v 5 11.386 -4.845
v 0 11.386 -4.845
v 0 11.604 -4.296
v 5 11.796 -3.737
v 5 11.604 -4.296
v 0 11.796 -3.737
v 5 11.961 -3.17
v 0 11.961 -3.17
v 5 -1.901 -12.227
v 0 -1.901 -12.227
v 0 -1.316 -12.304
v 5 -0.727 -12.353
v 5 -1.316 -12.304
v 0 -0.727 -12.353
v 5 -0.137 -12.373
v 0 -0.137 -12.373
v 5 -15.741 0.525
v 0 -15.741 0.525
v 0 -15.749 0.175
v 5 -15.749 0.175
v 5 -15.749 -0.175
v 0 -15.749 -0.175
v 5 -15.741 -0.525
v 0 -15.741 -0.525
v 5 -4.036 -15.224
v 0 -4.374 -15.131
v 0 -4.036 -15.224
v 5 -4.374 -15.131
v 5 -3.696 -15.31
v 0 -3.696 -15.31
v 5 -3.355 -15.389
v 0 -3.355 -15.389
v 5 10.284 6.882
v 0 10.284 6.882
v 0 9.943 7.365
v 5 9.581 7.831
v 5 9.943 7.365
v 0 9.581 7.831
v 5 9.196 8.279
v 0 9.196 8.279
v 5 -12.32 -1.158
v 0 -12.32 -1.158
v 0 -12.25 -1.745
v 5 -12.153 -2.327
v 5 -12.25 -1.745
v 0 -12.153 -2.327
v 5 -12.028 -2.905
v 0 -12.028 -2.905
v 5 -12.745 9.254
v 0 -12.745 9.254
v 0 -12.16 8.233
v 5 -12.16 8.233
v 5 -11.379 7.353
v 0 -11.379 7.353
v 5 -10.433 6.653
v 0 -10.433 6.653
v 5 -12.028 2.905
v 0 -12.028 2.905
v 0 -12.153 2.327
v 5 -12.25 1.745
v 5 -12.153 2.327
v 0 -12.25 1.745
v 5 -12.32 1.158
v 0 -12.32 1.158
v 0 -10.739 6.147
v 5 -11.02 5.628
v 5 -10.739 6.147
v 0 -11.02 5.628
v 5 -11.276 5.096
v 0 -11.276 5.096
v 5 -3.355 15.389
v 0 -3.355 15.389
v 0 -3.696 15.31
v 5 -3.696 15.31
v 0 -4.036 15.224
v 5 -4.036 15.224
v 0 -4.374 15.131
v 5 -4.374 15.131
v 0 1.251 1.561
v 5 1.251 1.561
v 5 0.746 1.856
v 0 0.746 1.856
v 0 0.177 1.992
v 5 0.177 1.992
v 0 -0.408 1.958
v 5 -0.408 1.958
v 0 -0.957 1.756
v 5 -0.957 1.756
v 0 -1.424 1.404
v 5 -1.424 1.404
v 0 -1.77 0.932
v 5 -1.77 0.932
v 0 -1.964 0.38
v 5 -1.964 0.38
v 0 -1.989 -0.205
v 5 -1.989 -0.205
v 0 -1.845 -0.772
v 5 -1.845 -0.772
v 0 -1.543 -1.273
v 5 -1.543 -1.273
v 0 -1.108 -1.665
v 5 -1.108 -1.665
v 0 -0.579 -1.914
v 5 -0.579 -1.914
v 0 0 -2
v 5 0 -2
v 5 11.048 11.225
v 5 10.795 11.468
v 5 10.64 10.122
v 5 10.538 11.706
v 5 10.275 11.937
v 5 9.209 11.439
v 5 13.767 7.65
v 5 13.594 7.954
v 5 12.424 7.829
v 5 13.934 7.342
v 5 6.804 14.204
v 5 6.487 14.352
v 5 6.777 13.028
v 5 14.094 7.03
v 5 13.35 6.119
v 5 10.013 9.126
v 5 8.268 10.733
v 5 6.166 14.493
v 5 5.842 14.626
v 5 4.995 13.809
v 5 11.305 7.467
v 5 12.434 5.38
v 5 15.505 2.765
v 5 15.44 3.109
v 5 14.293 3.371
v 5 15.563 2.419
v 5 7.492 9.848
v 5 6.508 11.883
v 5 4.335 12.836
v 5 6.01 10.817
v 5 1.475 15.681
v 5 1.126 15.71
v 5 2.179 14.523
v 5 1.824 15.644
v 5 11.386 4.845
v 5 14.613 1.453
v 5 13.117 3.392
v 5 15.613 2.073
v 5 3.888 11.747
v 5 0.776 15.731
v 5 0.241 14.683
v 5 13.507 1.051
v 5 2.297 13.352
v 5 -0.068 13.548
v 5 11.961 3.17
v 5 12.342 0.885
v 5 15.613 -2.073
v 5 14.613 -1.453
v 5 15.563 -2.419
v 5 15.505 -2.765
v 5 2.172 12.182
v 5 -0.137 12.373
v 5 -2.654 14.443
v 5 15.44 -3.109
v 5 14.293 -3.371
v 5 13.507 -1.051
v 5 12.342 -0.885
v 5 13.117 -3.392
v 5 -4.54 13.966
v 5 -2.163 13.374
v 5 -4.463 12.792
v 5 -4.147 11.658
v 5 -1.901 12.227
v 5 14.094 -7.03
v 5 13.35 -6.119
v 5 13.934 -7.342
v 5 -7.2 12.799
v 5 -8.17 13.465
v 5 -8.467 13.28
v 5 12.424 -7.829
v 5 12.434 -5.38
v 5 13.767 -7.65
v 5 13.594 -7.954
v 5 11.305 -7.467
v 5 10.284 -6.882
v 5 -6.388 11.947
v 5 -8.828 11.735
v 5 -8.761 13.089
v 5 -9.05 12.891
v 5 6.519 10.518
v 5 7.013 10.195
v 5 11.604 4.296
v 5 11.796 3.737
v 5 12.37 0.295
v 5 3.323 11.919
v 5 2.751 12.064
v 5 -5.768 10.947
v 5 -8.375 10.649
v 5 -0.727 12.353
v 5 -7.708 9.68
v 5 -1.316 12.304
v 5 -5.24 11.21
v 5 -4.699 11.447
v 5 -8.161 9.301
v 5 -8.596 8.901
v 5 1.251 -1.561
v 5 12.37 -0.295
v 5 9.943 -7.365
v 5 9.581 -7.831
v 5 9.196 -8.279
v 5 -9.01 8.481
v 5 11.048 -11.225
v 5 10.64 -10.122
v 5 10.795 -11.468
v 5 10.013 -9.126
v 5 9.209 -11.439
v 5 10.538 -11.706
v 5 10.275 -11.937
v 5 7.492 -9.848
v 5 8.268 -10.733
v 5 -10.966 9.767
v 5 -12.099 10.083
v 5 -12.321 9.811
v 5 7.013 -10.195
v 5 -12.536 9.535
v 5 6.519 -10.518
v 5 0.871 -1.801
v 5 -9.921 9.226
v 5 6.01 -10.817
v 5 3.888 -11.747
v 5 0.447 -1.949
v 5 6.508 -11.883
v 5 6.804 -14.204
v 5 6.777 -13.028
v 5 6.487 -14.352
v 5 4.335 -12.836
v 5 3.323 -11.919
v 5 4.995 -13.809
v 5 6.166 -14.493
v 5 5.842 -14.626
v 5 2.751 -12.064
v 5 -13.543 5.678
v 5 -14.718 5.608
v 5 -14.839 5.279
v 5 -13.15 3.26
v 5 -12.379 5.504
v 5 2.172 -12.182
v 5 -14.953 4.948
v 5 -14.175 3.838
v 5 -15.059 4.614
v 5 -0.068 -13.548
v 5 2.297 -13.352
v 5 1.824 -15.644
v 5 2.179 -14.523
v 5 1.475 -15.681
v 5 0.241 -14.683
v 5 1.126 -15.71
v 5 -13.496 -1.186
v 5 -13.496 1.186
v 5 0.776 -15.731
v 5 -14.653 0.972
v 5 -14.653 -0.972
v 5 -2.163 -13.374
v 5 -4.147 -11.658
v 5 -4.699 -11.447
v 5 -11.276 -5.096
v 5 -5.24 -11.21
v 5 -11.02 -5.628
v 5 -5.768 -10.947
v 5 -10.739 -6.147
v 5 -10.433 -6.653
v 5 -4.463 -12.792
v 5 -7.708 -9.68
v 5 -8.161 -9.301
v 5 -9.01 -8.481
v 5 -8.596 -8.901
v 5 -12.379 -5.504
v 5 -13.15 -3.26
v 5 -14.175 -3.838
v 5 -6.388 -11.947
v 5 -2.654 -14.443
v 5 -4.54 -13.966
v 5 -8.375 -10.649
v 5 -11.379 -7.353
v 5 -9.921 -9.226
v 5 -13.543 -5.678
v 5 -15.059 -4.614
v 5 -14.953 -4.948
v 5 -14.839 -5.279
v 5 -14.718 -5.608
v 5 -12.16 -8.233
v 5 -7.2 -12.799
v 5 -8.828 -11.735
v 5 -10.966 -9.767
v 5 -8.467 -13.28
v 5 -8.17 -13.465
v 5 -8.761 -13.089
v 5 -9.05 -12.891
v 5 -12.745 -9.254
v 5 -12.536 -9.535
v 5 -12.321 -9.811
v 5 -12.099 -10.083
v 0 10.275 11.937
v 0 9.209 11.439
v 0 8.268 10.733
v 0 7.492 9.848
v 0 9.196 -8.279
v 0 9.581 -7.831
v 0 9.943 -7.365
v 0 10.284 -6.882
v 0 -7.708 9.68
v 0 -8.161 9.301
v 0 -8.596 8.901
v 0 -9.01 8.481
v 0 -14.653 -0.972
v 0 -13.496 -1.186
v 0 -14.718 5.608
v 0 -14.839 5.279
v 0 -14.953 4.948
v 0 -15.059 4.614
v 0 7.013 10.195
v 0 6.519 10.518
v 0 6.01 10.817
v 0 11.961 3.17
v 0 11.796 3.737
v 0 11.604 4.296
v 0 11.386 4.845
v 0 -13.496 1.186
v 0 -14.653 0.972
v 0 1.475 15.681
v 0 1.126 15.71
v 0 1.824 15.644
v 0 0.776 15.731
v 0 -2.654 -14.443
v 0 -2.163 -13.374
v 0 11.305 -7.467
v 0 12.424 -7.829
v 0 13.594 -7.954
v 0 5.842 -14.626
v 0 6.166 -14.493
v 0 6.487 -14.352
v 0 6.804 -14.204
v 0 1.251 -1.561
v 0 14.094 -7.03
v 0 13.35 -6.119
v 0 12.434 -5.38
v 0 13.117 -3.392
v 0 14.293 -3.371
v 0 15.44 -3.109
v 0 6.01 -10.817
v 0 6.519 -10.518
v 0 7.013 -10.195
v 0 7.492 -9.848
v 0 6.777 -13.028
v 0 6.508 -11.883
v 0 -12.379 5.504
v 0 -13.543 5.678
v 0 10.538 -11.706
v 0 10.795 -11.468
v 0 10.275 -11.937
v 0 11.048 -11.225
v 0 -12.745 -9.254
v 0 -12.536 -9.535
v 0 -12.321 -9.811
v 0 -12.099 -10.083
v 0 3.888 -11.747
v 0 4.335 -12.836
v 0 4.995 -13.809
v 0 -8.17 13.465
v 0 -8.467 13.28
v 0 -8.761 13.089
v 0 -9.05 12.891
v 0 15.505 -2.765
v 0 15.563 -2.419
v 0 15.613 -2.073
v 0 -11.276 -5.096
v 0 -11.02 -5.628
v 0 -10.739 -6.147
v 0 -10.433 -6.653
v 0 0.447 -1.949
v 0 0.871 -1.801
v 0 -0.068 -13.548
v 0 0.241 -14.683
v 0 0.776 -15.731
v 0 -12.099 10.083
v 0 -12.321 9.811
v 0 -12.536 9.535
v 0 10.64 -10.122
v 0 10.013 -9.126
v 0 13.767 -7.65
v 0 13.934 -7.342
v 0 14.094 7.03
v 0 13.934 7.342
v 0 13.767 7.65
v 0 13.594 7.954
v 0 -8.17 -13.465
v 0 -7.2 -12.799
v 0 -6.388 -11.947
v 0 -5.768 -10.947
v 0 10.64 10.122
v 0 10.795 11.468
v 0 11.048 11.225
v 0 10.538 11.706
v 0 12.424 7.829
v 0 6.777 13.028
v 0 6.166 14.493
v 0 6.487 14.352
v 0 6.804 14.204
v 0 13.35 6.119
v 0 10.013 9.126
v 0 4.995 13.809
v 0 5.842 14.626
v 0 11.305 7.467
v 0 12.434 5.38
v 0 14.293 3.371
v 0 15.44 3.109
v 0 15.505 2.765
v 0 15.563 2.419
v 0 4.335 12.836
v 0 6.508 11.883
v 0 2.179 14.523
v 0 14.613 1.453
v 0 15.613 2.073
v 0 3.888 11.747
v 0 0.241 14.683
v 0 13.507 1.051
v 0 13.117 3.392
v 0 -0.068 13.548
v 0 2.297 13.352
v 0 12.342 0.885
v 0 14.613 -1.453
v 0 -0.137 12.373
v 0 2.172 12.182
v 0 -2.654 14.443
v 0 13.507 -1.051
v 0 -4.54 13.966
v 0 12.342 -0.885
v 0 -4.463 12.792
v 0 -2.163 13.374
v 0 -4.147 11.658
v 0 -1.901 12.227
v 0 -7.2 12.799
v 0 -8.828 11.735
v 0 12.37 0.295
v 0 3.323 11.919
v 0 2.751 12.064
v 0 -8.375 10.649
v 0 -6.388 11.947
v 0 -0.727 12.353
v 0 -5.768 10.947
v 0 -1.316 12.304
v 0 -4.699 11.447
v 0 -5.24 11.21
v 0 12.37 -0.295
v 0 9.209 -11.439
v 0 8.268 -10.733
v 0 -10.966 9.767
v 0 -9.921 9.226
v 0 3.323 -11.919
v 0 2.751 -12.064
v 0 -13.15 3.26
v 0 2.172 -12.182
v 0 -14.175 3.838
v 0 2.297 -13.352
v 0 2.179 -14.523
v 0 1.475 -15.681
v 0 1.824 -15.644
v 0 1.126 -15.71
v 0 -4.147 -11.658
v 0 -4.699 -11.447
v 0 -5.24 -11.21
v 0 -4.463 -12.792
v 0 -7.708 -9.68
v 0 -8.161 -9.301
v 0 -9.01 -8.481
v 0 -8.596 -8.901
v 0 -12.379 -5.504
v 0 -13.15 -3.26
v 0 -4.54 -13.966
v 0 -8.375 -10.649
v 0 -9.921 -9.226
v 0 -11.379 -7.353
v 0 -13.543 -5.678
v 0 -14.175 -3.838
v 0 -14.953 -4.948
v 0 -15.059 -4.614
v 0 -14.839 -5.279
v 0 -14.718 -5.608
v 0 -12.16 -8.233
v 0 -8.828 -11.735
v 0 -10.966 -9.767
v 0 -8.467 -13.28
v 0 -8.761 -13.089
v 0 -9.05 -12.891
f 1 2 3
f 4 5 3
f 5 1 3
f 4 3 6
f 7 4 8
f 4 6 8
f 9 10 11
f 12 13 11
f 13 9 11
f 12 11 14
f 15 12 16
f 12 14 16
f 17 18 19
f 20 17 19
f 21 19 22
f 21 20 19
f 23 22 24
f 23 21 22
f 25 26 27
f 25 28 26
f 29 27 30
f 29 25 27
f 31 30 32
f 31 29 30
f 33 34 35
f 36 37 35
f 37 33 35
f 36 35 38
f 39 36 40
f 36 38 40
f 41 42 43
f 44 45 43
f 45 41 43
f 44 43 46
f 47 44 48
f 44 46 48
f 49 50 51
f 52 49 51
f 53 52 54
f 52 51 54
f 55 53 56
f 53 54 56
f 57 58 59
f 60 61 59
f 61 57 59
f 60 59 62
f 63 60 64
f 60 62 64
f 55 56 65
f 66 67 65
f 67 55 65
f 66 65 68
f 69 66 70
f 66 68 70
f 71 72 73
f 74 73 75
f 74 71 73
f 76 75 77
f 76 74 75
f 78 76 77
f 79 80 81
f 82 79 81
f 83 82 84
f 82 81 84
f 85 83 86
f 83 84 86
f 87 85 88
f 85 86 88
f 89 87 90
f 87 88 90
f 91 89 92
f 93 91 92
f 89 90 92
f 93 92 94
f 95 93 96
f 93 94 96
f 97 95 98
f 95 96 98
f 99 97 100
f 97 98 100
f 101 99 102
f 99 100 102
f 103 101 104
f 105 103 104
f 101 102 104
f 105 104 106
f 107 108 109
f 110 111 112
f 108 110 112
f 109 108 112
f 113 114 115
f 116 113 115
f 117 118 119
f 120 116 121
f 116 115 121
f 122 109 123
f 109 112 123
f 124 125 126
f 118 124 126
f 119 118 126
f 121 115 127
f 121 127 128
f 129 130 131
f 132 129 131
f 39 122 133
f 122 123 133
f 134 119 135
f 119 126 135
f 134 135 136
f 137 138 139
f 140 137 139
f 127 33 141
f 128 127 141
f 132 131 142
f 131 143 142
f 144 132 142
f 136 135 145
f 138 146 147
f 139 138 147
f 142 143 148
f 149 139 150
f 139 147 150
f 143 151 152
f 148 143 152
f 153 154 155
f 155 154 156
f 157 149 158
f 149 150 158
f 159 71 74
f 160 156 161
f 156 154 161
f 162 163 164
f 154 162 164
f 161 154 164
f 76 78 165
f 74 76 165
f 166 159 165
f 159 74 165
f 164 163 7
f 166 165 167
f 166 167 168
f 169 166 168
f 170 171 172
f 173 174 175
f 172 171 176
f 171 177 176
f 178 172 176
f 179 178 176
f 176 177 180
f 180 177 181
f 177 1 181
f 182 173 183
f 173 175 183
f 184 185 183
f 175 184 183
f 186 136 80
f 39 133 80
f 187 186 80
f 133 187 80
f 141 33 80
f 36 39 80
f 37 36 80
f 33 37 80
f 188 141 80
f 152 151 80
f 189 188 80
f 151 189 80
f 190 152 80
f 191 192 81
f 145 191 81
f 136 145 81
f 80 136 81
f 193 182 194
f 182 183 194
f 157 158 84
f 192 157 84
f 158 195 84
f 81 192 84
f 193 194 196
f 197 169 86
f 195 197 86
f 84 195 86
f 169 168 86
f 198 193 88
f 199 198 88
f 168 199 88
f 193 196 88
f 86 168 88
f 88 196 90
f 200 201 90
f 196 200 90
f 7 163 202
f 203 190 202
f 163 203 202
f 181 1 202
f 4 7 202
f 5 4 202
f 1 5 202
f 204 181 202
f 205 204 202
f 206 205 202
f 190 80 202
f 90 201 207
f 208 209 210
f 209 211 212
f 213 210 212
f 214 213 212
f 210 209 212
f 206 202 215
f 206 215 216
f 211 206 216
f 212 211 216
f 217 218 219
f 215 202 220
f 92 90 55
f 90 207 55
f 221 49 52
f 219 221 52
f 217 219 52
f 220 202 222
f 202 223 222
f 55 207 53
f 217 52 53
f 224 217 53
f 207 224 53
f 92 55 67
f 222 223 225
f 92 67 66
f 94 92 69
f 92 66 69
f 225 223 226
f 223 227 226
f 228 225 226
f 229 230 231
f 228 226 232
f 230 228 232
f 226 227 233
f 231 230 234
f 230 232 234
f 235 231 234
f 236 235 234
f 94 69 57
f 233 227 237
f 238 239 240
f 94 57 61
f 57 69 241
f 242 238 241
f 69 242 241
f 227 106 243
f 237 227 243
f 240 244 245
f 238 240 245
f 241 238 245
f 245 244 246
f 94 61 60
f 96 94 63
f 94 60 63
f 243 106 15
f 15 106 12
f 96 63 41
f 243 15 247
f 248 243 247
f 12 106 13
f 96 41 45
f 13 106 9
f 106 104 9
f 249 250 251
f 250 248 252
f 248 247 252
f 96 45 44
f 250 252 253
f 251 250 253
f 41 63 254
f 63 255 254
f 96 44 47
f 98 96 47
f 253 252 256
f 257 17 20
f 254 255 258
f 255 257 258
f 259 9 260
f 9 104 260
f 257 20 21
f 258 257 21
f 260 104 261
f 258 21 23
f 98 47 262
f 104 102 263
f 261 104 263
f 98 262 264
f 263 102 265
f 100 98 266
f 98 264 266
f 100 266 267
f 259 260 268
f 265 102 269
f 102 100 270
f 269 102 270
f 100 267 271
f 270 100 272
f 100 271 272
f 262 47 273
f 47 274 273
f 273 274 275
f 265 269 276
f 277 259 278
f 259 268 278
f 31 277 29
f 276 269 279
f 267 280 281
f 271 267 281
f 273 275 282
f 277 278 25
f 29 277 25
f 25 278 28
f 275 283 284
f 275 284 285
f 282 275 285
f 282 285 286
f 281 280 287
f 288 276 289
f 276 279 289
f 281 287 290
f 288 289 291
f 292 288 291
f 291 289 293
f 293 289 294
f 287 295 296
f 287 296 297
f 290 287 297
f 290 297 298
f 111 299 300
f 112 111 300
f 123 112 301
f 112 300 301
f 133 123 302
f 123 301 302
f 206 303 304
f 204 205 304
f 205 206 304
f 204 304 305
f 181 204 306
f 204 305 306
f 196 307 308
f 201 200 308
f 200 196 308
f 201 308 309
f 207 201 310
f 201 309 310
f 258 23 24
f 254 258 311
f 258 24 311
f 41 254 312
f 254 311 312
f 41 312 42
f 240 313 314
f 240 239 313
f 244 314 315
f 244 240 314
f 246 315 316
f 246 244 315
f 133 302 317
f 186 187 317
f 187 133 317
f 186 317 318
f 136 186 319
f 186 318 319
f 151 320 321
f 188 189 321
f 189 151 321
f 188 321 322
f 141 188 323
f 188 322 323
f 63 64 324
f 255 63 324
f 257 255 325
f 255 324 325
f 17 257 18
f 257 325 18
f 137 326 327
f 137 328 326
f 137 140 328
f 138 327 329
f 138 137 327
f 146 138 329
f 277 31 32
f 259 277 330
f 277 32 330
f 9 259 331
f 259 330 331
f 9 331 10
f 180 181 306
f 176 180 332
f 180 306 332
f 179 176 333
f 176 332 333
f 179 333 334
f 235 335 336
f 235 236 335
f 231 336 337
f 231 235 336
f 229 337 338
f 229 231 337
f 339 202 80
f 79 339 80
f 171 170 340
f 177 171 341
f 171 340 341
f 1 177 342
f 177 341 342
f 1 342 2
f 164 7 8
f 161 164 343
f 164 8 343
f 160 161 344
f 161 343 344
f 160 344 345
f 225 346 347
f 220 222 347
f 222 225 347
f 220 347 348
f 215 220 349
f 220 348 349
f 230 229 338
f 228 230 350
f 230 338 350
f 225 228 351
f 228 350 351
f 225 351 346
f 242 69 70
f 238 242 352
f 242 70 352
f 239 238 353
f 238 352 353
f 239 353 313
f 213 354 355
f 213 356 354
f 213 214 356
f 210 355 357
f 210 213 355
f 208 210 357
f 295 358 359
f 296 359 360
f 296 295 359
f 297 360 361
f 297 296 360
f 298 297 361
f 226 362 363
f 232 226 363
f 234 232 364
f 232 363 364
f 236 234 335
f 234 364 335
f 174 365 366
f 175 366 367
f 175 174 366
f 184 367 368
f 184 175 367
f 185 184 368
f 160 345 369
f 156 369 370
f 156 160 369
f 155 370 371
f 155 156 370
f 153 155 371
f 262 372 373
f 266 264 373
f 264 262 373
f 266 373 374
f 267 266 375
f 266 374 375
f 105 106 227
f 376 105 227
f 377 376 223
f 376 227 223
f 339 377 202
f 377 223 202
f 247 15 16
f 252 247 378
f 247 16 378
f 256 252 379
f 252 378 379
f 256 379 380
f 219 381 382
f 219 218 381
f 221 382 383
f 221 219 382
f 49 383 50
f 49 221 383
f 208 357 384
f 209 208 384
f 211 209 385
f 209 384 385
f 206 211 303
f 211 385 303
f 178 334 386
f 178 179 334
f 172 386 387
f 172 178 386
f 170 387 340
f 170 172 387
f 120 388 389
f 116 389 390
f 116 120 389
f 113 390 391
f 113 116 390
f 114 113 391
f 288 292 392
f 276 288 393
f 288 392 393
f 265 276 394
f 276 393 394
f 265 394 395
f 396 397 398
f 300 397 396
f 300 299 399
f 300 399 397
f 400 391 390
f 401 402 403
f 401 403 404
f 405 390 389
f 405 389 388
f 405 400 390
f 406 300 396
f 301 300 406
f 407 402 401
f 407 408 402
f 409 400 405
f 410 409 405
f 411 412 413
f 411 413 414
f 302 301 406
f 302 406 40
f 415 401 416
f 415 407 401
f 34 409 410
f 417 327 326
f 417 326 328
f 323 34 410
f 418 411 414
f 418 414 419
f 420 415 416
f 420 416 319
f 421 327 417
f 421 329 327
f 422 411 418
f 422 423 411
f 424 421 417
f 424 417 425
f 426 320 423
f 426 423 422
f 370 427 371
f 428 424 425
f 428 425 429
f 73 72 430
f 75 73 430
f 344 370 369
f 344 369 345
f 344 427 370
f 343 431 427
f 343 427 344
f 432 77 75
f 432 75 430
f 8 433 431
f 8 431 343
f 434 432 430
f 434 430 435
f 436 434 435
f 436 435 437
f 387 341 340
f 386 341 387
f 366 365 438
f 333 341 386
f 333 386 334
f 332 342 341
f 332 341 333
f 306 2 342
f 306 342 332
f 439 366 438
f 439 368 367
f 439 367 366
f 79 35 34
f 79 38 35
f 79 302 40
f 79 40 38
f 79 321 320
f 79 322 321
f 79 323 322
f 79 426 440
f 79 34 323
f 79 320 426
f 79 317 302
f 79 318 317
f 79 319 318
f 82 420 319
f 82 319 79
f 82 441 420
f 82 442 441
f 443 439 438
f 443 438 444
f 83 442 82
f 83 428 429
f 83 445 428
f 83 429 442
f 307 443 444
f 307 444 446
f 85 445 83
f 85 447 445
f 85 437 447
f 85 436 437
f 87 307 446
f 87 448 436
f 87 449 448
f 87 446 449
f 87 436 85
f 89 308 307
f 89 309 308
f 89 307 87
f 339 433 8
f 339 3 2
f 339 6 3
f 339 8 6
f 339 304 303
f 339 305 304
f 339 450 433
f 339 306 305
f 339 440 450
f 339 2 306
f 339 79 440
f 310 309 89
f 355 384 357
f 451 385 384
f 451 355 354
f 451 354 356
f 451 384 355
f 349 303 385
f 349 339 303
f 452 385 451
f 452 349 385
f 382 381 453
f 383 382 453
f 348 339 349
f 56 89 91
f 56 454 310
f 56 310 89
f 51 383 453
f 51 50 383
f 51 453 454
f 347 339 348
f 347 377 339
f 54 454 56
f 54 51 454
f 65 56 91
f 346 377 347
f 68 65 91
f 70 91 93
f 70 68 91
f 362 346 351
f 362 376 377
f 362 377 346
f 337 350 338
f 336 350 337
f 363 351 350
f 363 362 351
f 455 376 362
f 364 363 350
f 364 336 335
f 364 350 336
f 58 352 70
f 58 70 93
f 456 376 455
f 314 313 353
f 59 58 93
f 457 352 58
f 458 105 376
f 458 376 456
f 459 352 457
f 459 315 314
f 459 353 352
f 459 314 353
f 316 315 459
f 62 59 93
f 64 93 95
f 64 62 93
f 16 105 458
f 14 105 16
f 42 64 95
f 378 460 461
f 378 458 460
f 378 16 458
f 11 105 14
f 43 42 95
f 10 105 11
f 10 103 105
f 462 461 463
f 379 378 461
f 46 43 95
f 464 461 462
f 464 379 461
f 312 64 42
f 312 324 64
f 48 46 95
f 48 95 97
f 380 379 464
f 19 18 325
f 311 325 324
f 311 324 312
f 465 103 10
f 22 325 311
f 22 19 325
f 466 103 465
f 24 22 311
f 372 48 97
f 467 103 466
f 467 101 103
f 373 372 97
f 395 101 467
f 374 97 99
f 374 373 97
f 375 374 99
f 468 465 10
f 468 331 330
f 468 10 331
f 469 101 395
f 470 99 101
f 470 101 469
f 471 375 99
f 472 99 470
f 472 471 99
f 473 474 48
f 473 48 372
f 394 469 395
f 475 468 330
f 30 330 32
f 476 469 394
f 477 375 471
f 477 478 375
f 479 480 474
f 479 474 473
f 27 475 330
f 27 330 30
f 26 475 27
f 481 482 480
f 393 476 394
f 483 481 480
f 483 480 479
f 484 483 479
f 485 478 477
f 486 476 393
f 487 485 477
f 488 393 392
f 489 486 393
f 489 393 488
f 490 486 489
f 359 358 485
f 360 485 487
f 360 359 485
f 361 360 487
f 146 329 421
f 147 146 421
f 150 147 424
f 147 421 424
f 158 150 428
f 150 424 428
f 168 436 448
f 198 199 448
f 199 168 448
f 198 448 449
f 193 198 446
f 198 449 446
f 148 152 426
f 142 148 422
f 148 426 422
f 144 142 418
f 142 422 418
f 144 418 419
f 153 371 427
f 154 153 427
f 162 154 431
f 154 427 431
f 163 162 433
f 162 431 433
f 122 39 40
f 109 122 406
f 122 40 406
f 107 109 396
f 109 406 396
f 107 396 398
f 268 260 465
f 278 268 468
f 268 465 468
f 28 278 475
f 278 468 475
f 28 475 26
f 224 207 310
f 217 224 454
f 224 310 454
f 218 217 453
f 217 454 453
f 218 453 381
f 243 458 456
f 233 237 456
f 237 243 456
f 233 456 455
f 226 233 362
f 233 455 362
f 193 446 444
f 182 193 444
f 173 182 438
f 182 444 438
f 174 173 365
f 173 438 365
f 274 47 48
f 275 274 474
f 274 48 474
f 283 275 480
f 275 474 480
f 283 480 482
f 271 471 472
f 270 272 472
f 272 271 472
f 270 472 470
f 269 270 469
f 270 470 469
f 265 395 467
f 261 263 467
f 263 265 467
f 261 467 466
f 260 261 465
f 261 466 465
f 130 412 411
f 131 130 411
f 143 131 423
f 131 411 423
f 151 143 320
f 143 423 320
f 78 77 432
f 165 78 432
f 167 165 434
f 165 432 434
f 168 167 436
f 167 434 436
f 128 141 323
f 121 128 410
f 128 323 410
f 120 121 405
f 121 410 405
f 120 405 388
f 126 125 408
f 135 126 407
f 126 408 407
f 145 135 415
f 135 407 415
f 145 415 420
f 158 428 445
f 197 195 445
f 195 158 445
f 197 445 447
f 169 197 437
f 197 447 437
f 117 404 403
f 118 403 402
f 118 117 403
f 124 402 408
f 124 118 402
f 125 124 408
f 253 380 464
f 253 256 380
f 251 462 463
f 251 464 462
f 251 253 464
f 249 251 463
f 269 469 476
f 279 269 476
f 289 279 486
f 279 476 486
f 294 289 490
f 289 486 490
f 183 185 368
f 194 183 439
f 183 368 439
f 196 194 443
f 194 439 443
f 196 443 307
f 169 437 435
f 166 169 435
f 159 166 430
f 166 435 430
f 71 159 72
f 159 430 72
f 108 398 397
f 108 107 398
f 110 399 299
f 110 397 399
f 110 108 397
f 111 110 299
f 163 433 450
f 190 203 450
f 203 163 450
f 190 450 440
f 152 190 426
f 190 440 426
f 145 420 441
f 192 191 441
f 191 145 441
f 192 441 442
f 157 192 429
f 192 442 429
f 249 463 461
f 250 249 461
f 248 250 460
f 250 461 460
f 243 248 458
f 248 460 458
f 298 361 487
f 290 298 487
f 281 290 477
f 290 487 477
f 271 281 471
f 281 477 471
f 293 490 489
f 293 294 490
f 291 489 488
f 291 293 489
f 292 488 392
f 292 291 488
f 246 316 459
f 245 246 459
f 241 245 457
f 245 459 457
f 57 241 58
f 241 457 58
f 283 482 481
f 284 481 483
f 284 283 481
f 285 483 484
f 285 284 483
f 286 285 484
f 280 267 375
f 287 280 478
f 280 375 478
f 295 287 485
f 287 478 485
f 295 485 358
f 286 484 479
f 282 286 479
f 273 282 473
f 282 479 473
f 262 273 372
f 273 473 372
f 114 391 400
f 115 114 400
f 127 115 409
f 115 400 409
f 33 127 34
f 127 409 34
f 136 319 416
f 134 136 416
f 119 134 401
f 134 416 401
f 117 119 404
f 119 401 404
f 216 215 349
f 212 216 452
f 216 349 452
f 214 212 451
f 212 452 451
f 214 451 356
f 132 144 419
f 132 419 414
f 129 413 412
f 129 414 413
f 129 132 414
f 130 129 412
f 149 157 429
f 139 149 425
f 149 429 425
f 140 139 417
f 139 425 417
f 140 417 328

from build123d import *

# Parameters (mm, degrees)
BASPROSKE_W        = 5
BASPROSKE_H        = 15.75
TOOTHCUT_DEPTH     = 23.828162432
TEETHCUTS_COUNT    = 19
TEETHCUTS_ANGLE    = 341.052631579
BORSKE_R           = 0.4
BORE_DEPTH         = 50.0000508
CUT_EXTRUDE1_DEPTH = 23.81496003


with BuildPart() as part:
    # BasProSke → Base-Revolve (revolve)
    with BuildSketch(Plane(origin=(0, 0, 0), x_dir=(1, 0, 0), z_dir=(0, 1, 0)), mode=Mode.PRIVATE) as base_revolve_sk:
        with Locations((2.5, 7.875)):
            Rectangle(BASPROSKE_W, BASPROSKE_H)
    revolve(base_revolve_sk.sketch.rotate(Axis((-10, 0, 0), (1, 0, 0)), 180), axis=Axis((-10, 0, 0), (1, 0, 0)))

    # TooCutSke → ToothCut (cut, through all)
    with BuildSketch(Plane(origin=(0, 0, 0), x_dir=(0, 0, -1), z_dir=(1, 0, 0))):
        with BuildLine():
            ThreePointArc((0.885187307, 12.34229798), (0, 12.374), (-0.885187307, 12.34229798))
            ThreePointArc((-0.885187307, 12.34229798), (-1.228281365, 14.084307739), (-2.090723145, 15.636243855))
            ThreePointArc((-2.090723145, 15.636243855), (0, 15.7754), (2.090723145, 15.636243855))
            ThreePointArc((2.090723145, 15.636243855), (1.228281365, 14.084307739), (0.885187307, 12.34229798))
        make_face()
    toothcut = extrude(amount=TOOTHCUT_DEPTH, mode=Mode.SUBTRACT)

    # TeethCuts: ToothCut ×19 about axis
    teethcuts_axis = Axis((-10, 0, 0), (1, 0, 0))
    for i in range(1, TEETHCUTS_COUNT):
        add(toothcut.rotate(teethcuts_axis, i * TEETHCUTS_ANGLE / (TEETHCUTS_COUNT - 1)), mode=Mode.SUBTRACT)

    # BorSke → Bore (cut, symmetric)
    with BuildSketch(Plane(origin=(0, 0, 0), x_dir=(0, 0, -1), z_dir=(1, 0, 0))):
        with Locations(Location((0, 0, 0), (0, 0, 180))):
            Circle(BORSKE_R)
    extrude(amount=BORE_DEPTH, both=True, mode=Mode.SUBTRACT)

    # Sketch1 → Cut-Extrude1 (cut, through all)
    with BuildSketch(Plane(origin=(5, 0, 0), x_dir=(0, 0, -1), z_dir=(1, 0, 0))):
        with BuildLine():
            Line((1.560589416, 1.250823998), (-1.560589416, 1.250823998))
            ThreePointArc((-1.560589416, 1.250823998), (-0.66288052, -1.886952415), (2, 0))
            ThreePointArc((2, 0), (1.886952415, 0.66288052), (1.560589416, 1.250823998))
        make_face()
    extrude(amount=-CUT_EXTRUDE1_DEPTH, mode=Mode.SUBTRACT)


solid = part.part
